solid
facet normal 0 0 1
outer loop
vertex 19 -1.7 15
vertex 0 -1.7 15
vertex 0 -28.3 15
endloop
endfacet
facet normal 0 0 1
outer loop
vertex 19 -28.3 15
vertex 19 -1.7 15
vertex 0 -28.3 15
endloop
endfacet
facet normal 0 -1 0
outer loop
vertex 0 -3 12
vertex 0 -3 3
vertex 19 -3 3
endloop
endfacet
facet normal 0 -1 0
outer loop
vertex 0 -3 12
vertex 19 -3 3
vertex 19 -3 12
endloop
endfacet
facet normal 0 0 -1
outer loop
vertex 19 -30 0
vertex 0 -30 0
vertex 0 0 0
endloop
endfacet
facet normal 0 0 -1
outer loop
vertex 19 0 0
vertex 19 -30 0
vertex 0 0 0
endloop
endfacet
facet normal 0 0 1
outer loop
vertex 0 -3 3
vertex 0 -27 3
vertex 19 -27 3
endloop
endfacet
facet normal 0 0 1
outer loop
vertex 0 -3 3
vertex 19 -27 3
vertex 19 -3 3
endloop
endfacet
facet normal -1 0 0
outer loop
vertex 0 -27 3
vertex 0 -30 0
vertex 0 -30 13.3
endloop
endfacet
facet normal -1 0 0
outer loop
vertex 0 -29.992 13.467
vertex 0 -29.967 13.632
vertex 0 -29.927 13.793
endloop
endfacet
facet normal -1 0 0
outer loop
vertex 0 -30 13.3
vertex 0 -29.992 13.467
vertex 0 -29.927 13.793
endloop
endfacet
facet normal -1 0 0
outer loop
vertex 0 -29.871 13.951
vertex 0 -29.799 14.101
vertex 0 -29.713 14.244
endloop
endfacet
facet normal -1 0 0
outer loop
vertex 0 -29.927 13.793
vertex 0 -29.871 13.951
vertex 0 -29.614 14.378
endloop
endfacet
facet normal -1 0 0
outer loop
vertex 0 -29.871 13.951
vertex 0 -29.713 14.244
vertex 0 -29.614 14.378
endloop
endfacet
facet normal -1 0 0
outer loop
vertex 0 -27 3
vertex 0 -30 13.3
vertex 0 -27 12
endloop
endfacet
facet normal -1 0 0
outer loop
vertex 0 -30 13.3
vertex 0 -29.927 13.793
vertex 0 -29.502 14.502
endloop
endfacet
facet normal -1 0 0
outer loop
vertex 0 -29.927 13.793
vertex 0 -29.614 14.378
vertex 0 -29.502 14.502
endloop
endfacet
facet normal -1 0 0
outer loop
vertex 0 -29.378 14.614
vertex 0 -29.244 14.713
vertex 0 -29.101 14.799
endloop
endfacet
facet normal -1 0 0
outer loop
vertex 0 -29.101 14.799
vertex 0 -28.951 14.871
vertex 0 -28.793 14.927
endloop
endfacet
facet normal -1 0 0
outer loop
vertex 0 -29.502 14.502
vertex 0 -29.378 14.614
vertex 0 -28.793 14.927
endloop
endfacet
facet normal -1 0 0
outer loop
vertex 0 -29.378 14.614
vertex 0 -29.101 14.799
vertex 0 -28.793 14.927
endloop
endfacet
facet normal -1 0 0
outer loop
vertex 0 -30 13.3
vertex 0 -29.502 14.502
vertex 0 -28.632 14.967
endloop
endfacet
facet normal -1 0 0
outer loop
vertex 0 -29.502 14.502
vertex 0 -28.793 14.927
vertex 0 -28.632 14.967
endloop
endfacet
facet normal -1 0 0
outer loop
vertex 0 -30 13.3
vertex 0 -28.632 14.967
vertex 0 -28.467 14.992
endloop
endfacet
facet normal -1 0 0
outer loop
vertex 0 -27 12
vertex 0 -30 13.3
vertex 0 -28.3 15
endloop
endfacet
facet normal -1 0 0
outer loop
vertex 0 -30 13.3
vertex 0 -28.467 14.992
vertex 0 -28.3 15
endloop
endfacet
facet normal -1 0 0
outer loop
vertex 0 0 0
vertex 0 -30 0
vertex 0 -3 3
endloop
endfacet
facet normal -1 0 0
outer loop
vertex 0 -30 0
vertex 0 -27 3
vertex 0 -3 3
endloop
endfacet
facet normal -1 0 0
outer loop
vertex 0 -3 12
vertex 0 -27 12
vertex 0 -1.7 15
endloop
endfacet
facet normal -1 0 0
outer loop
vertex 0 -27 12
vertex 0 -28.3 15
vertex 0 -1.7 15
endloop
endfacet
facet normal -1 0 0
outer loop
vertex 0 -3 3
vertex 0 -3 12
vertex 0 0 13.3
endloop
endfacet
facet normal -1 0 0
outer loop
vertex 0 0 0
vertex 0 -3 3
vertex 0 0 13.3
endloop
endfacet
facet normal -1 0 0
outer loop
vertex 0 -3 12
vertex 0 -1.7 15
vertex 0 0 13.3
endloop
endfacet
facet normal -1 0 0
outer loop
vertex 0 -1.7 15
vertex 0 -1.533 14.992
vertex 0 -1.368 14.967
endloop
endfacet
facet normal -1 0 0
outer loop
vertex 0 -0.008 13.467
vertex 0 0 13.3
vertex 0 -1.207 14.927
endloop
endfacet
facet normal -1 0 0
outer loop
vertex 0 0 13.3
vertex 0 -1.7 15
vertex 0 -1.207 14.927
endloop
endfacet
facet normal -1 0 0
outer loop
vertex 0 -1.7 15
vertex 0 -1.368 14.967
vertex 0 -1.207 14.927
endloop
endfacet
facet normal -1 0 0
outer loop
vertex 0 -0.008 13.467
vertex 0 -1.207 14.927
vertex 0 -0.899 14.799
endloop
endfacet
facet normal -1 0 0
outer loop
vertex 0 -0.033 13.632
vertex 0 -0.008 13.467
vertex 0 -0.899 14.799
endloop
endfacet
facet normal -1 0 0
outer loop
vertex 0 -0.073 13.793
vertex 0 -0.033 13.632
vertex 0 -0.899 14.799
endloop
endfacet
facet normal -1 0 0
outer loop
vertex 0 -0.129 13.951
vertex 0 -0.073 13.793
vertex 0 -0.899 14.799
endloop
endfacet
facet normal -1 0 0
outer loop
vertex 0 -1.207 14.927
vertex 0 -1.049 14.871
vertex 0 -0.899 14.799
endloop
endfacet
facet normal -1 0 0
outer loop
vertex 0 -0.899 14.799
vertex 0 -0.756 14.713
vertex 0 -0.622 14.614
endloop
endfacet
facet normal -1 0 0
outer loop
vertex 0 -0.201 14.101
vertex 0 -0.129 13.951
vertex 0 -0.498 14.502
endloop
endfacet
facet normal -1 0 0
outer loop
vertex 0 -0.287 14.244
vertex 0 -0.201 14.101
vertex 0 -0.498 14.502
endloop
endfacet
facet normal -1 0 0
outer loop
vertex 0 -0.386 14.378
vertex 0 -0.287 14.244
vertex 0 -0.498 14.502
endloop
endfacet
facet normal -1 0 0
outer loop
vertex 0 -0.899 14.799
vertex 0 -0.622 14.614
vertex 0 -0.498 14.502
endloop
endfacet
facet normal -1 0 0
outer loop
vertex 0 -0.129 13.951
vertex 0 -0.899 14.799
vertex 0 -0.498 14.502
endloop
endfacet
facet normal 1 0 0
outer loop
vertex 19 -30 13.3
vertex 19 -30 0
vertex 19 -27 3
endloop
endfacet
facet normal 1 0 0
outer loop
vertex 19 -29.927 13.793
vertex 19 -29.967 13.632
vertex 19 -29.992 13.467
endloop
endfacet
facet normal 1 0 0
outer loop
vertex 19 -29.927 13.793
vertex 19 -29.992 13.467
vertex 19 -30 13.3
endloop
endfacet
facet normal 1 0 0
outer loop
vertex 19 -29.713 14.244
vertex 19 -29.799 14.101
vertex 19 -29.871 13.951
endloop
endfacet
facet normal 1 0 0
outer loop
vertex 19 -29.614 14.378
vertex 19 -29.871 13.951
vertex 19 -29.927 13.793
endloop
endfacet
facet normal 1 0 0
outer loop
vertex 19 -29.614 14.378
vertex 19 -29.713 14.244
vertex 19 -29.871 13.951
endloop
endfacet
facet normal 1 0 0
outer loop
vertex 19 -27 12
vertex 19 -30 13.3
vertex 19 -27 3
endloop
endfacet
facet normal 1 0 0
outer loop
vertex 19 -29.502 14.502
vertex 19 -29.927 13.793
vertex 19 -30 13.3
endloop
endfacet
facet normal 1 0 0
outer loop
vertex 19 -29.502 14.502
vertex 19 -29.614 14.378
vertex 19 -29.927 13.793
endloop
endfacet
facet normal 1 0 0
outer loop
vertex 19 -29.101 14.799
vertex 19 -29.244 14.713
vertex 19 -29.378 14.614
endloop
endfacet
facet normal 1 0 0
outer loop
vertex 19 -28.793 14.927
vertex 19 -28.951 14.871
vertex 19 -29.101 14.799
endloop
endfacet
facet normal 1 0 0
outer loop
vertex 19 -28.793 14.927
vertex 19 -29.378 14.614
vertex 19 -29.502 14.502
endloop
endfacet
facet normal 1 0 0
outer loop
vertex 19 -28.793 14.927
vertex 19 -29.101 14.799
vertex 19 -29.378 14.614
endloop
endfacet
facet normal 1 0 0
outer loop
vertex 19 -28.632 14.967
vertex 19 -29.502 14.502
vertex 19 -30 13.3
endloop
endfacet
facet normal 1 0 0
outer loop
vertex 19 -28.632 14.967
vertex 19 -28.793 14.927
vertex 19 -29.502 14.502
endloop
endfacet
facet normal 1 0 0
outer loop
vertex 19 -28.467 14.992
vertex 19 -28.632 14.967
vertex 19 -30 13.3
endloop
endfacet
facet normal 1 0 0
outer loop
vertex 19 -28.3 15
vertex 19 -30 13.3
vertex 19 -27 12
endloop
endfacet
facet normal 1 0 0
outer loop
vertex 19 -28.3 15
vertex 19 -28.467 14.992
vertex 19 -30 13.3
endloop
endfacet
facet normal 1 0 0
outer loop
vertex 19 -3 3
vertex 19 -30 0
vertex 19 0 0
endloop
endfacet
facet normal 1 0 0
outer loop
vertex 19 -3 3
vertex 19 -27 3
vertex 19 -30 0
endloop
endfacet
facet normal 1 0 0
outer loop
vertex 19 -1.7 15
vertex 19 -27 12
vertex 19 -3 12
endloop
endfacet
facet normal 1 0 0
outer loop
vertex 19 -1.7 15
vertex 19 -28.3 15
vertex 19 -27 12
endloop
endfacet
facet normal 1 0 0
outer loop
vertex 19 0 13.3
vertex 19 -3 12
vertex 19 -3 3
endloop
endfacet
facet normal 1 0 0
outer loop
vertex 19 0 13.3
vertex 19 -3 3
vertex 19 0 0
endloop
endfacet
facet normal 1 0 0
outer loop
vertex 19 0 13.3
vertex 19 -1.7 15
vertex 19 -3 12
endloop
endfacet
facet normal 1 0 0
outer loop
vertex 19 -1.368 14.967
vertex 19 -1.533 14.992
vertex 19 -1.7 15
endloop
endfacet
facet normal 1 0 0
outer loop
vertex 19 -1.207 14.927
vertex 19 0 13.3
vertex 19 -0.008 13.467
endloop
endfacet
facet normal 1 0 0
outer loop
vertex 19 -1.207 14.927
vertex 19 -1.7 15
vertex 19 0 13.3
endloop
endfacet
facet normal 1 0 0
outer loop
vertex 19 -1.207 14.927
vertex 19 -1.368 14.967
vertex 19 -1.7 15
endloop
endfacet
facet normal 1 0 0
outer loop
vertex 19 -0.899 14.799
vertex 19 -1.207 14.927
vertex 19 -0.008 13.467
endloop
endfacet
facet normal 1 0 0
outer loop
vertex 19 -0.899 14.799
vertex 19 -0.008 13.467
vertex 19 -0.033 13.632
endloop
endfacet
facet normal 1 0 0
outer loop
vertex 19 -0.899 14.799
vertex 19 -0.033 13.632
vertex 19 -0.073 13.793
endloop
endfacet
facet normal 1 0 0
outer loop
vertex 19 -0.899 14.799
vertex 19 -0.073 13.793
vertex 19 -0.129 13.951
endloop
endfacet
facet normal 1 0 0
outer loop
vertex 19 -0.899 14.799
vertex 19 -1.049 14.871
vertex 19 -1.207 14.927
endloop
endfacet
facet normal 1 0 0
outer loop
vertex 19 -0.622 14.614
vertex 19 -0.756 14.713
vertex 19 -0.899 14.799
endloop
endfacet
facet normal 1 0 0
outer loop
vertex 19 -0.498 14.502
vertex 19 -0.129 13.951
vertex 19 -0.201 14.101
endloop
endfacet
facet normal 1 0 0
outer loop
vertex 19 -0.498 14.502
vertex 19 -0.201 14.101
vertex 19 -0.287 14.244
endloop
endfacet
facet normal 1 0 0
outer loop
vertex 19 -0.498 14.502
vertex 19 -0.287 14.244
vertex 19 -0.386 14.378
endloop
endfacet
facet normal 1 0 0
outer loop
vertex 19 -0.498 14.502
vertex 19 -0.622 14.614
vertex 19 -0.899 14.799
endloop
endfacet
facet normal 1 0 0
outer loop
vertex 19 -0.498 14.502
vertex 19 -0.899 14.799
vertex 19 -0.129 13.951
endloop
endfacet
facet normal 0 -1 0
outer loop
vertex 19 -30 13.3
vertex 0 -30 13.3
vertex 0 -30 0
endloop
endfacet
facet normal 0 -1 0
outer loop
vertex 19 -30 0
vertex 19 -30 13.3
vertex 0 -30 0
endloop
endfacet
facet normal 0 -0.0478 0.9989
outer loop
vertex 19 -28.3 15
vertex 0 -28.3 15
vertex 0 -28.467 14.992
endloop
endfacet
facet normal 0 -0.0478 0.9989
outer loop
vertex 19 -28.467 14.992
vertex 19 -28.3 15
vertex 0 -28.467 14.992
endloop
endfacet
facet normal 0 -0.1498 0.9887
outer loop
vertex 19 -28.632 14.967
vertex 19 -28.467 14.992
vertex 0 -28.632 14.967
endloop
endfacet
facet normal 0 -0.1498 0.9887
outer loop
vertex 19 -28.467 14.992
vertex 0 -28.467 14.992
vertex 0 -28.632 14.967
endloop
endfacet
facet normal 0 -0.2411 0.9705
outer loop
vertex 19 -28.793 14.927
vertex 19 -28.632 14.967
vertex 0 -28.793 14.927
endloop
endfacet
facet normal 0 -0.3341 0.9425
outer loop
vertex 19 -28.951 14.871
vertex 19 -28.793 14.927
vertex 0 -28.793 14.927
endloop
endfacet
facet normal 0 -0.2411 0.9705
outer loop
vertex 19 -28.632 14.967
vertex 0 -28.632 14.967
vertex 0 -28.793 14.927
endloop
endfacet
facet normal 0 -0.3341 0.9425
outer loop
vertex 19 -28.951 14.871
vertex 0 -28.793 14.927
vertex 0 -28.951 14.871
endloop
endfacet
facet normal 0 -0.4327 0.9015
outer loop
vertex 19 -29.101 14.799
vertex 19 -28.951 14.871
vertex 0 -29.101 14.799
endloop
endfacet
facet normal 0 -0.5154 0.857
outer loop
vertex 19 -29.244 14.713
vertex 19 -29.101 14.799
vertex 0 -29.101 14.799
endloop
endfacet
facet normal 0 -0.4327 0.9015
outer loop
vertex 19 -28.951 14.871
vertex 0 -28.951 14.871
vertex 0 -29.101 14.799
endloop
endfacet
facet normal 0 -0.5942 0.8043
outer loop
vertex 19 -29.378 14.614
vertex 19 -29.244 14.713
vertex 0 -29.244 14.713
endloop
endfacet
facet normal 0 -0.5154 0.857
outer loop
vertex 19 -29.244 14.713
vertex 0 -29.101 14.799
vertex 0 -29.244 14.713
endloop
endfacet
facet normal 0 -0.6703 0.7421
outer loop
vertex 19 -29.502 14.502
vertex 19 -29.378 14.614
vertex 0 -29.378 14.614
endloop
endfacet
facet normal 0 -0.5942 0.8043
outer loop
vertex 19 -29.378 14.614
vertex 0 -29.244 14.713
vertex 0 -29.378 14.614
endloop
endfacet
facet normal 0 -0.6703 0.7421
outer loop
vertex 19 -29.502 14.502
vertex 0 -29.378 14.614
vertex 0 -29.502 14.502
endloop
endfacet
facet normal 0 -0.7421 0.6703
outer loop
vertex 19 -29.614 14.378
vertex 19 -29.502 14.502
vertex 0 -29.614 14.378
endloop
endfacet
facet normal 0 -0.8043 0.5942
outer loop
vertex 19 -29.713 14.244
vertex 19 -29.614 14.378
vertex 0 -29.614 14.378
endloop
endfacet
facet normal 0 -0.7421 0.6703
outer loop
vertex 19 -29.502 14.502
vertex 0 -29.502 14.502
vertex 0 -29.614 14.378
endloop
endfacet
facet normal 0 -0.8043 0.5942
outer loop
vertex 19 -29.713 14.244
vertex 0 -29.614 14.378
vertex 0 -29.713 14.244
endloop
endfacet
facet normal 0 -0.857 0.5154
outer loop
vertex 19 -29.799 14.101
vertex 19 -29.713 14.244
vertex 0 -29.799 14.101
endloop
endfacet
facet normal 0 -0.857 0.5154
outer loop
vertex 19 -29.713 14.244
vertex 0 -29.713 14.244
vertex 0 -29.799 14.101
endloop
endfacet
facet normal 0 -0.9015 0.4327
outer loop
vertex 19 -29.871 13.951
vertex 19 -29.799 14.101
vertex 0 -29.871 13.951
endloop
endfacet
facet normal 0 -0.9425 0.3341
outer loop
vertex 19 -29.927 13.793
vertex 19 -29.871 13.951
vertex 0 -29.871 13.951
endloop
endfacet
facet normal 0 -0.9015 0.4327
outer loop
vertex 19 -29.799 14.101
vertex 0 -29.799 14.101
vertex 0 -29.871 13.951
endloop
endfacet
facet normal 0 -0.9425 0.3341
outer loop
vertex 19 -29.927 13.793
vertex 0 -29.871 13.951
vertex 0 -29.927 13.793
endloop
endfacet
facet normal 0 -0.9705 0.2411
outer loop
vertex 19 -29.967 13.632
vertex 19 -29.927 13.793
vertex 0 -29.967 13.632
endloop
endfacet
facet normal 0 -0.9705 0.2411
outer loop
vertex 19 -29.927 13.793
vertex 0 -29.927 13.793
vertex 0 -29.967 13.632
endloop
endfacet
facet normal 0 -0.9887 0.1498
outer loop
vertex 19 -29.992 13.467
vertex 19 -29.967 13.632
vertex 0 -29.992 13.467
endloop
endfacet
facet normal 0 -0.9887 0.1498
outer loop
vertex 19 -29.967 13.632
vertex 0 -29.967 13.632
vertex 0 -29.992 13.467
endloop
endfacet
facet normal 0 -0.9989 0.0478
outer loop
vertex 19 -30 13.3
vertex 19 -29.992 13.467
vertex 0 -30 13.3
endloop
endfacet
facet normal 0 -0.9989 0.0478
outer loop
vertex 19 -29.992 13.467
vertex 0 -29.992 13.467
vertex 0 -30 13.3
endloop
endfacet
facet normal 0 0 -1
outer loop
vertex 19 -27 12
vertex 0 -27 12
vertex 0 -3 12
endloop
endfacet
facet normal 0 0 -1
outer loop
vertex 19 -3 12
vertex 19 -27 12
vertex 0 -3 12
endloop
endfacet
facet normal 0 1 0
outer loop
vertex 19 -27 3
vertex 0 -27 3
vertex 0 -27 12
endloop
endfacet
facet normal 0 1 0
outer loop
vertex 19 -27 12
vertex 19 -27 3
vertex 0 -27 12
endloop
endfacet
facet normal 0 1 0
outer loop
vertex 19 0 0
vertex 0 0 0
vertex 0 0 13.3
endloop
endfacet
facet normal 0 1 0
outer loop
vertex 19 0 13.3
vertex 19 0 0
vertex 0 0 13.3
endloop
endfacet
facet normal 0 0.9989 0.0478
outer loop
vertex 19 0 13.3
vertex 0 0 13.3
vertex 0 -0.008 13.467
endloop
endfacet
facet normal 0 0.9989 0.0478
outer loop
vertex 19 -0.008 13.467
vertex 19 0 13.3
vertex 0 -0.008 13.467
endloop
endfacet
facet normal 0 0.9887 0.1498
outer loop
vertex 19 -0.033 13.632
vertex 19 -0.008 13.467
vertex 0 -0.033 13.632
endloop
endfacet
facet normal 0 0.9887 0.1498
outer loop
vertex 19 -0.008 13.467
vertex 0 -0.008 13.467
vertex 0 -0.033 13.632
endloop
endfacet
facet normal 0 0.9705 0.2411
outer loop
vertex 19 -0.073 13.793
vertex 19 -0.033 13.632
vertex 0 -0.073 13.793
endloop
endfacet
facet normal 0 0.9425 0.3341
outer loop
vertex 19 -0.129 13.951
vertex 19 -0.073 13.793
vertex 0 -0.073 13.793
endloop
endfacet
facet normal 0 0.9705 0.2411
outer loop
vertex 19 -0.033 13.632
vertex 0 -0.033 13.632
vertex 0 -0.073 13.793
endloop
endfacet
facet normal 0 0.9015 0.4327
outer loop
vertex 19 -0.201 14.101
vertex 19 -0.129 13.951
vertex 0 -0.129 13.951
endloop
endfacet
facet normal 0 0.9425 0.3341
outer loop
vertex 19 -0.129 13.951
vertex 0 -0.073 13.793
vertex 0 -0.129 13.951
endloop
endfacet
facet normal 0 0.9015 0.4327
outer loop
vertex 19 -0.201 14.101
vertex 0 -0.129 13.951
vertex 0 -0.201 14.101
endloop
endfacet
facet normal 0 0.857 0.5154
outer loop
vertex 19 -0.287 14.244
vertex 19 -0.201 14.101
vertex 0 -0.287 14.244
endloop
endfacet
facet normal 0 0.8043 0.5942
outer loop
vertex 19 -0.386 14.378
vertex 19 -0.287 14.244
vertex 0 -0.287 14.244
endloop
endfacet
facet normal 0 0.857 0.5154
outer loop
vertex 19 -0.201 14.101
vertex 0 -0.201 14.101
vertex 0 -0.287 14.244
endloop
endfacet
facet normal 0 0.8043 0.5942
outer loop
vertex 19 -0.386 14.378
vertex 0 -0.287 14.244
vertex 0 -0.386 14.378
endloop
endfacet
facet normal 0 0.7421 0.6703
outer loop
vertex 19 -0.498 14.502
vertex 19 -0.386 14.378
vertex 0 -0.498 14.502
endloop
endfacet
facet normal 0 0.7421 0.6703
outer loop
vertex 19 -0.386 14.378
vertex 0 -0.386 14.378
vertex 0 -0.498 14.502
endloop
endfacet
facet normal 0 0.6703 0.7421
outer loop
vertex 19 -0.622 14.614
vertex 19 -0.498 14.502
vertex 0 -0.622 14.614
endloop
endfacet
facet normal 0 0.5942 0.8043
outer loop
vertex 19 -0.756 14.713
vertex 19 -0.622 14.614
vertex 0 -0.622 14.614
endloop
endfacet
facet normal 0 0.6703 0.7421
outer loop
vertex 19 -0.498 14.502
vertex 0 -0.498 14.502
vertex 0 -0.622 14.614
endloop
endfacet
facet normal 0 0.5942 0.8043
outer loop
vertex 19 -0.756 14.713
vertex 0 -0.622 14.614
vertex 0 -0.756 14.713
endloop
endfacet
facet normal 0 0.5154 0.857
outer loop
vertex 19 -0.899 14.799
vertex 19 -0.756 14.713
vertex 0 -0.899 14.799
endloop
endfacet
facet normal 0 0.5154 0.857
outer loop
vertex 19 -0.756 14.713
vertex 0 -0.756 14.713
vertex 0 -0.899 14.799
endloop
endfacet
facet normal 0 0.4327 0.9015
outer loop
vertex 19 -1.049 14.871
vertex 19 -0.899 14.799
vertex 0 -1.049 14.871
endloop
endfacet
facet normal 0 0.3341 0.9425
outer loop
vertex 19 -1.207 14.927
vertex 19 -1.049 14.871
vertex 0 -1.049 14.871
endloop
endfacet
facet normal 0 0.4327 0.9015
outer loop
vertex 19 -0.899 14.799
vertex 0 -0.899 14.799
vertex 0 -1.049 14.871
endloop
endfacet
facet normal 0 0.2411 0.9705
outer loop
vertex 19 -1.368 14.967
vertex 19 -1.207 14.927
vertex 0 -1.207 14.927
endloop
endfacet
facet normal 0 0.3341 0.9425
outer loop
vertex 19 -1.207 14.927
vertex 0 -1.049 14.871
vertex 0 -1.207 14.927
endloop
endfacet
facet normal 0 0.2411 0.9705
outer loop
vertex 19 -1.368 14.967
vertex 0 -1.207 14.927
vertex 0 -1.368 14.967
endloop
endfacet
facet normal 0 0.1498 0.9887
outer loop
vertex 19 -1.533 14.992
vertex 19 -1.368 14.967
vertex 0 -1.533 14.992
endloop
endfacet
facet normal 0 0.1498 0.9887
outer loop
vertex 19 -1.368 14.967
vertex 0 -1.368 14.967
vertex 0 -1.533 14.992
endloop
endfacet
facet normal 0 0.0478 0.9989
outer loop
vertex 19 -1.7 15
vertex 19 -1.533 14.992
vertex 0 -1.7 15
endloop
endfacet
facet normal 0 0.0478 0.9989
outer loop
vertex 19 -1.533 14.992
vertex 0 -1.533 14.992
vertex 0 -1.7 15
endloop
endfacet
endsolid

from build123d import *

# Parameters (mm, degrees)
F0_W     = 24
F0_H     = 9
F1_DEPTH = 19


with BuildPart() as f1:
    # F0 (on Right) → F1 (new body)
    with BuildSketch(Plane.YZ):
        with BuildLine():
            Line((-30, 0), (0, 0))
            Line((0, 0), (0, 13.3))
            ThreePointArc((0, 13.3), (-0.497918, 14.502082), (-1.7, 15))
            Line((-1.7, 15), (-13.862342, 15))
            Line((-13.862342, 15), (-28.3, 15))
            ThreePointArc((-28.3, 15), (-29.502082, 14.502082), (-30, 13.3))
            Line((-30, 13.3), (-30, 0))
        make_face()
        with Locations((-15, 7.5)):
            Rectangle(F0_W, F0_H, mode=Mode.SUBTRACT)
    extrude(amount=F1_DEPTH)


solid = f1.part
